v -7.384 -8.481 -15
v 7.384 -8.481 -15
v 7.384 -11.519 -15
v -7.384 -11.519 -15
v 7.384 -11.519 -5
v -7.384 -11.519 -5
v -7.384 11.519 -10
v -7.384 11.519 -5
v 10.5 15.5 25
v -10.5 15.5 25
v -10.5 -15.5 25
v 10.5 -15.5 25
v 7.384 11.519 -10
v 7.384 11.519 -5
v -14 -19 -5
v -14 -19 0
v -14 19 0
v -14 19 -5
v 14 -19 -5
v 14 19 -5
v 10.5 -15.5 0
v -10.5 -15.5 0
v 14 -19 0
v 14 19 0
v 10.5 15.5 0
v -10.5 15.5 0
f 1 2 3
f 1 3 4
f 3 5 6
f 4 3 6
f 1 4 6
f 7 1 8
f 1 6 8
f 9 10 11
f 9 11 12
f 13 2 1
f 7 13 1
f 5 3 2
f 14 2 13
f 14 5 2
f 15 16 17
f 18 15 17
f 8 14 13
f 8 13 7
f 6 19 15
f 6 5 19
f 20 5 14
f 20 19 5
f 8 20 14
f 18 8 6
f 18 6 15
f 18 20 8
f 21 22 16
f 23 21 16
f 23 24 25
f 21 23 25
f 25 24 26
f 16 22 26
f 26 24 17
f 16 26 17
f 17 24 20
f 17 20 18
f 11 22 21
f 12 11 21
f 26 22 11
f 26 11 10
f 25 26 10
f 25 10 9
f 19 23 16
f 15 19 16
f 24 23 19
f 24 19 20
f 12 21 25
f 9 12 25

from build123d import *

# Parameters (mm, degrees)
SKETCH1_W           = 21
SKETCH1_H           = 31
BOSS_EXTRUDE1_DEPTH = 25
SKETCH2_W           = 28
SKETCH2_H           = 38
BOSS_EXTRUDE2_DEPTH = 5
SKETCH3_W           = 14.768534612
SKETCH3_H           = 23.038215668
BOSS_EXTRUDE3_DEPTH = 10
CHAMFER1_SIZE       = 5
CHAMFER1_SIZE2      = 20


with BuildPart() as part:
    # Sketch1 → Boss-Extrude1 (new body)
    with BuildSketch(Plane.XY):
        Rectangle(SKETCH1_W, SKETCH1_H)
    extrude(amount=BOSS_EXTRUDE1_DEPTH)

    # Sketch2 → Boss-Extrude2 (add)
    with BuildSketch(Plane(origin=(0, 0, 0), x_dir=(-1, 0, 0), z_dir=(0, 0, -1))):
        Rectangle(SKETCH2_W, SKETCH2_H)
    extrude(amount=BOSS_EXTRUDE2_DEPTH)

    # Sketch3 → Boss-Extrude3 (add)
    with BuildSketch(Plane(origin=(0, 0, -5), x_dir=(-1, 0, 0), z_dir=(0, 0, -1))):
        Rectangle(SKETCH3_W, SKETCH3_H)
    extrude(amount=BOSS_EXTRUDE3_DEPTH)

    # Chamfer1
    chamfer1_edges = [part.edges().sort_by_distance(p)[0] for p in [
        (0, 11.519107834, -15),
    ]]
    chamfer1_side = [part.faces().sort_by_distance(p)[0] for p in [
        (0, 11.519107834, -10),
    ]]
    chamfer(chamfer1_edges, length=CHAMFER1_SIZE, length2=CHAMFER1_SIZE2, reference=chamfer1_side[0])


solid = part.part
